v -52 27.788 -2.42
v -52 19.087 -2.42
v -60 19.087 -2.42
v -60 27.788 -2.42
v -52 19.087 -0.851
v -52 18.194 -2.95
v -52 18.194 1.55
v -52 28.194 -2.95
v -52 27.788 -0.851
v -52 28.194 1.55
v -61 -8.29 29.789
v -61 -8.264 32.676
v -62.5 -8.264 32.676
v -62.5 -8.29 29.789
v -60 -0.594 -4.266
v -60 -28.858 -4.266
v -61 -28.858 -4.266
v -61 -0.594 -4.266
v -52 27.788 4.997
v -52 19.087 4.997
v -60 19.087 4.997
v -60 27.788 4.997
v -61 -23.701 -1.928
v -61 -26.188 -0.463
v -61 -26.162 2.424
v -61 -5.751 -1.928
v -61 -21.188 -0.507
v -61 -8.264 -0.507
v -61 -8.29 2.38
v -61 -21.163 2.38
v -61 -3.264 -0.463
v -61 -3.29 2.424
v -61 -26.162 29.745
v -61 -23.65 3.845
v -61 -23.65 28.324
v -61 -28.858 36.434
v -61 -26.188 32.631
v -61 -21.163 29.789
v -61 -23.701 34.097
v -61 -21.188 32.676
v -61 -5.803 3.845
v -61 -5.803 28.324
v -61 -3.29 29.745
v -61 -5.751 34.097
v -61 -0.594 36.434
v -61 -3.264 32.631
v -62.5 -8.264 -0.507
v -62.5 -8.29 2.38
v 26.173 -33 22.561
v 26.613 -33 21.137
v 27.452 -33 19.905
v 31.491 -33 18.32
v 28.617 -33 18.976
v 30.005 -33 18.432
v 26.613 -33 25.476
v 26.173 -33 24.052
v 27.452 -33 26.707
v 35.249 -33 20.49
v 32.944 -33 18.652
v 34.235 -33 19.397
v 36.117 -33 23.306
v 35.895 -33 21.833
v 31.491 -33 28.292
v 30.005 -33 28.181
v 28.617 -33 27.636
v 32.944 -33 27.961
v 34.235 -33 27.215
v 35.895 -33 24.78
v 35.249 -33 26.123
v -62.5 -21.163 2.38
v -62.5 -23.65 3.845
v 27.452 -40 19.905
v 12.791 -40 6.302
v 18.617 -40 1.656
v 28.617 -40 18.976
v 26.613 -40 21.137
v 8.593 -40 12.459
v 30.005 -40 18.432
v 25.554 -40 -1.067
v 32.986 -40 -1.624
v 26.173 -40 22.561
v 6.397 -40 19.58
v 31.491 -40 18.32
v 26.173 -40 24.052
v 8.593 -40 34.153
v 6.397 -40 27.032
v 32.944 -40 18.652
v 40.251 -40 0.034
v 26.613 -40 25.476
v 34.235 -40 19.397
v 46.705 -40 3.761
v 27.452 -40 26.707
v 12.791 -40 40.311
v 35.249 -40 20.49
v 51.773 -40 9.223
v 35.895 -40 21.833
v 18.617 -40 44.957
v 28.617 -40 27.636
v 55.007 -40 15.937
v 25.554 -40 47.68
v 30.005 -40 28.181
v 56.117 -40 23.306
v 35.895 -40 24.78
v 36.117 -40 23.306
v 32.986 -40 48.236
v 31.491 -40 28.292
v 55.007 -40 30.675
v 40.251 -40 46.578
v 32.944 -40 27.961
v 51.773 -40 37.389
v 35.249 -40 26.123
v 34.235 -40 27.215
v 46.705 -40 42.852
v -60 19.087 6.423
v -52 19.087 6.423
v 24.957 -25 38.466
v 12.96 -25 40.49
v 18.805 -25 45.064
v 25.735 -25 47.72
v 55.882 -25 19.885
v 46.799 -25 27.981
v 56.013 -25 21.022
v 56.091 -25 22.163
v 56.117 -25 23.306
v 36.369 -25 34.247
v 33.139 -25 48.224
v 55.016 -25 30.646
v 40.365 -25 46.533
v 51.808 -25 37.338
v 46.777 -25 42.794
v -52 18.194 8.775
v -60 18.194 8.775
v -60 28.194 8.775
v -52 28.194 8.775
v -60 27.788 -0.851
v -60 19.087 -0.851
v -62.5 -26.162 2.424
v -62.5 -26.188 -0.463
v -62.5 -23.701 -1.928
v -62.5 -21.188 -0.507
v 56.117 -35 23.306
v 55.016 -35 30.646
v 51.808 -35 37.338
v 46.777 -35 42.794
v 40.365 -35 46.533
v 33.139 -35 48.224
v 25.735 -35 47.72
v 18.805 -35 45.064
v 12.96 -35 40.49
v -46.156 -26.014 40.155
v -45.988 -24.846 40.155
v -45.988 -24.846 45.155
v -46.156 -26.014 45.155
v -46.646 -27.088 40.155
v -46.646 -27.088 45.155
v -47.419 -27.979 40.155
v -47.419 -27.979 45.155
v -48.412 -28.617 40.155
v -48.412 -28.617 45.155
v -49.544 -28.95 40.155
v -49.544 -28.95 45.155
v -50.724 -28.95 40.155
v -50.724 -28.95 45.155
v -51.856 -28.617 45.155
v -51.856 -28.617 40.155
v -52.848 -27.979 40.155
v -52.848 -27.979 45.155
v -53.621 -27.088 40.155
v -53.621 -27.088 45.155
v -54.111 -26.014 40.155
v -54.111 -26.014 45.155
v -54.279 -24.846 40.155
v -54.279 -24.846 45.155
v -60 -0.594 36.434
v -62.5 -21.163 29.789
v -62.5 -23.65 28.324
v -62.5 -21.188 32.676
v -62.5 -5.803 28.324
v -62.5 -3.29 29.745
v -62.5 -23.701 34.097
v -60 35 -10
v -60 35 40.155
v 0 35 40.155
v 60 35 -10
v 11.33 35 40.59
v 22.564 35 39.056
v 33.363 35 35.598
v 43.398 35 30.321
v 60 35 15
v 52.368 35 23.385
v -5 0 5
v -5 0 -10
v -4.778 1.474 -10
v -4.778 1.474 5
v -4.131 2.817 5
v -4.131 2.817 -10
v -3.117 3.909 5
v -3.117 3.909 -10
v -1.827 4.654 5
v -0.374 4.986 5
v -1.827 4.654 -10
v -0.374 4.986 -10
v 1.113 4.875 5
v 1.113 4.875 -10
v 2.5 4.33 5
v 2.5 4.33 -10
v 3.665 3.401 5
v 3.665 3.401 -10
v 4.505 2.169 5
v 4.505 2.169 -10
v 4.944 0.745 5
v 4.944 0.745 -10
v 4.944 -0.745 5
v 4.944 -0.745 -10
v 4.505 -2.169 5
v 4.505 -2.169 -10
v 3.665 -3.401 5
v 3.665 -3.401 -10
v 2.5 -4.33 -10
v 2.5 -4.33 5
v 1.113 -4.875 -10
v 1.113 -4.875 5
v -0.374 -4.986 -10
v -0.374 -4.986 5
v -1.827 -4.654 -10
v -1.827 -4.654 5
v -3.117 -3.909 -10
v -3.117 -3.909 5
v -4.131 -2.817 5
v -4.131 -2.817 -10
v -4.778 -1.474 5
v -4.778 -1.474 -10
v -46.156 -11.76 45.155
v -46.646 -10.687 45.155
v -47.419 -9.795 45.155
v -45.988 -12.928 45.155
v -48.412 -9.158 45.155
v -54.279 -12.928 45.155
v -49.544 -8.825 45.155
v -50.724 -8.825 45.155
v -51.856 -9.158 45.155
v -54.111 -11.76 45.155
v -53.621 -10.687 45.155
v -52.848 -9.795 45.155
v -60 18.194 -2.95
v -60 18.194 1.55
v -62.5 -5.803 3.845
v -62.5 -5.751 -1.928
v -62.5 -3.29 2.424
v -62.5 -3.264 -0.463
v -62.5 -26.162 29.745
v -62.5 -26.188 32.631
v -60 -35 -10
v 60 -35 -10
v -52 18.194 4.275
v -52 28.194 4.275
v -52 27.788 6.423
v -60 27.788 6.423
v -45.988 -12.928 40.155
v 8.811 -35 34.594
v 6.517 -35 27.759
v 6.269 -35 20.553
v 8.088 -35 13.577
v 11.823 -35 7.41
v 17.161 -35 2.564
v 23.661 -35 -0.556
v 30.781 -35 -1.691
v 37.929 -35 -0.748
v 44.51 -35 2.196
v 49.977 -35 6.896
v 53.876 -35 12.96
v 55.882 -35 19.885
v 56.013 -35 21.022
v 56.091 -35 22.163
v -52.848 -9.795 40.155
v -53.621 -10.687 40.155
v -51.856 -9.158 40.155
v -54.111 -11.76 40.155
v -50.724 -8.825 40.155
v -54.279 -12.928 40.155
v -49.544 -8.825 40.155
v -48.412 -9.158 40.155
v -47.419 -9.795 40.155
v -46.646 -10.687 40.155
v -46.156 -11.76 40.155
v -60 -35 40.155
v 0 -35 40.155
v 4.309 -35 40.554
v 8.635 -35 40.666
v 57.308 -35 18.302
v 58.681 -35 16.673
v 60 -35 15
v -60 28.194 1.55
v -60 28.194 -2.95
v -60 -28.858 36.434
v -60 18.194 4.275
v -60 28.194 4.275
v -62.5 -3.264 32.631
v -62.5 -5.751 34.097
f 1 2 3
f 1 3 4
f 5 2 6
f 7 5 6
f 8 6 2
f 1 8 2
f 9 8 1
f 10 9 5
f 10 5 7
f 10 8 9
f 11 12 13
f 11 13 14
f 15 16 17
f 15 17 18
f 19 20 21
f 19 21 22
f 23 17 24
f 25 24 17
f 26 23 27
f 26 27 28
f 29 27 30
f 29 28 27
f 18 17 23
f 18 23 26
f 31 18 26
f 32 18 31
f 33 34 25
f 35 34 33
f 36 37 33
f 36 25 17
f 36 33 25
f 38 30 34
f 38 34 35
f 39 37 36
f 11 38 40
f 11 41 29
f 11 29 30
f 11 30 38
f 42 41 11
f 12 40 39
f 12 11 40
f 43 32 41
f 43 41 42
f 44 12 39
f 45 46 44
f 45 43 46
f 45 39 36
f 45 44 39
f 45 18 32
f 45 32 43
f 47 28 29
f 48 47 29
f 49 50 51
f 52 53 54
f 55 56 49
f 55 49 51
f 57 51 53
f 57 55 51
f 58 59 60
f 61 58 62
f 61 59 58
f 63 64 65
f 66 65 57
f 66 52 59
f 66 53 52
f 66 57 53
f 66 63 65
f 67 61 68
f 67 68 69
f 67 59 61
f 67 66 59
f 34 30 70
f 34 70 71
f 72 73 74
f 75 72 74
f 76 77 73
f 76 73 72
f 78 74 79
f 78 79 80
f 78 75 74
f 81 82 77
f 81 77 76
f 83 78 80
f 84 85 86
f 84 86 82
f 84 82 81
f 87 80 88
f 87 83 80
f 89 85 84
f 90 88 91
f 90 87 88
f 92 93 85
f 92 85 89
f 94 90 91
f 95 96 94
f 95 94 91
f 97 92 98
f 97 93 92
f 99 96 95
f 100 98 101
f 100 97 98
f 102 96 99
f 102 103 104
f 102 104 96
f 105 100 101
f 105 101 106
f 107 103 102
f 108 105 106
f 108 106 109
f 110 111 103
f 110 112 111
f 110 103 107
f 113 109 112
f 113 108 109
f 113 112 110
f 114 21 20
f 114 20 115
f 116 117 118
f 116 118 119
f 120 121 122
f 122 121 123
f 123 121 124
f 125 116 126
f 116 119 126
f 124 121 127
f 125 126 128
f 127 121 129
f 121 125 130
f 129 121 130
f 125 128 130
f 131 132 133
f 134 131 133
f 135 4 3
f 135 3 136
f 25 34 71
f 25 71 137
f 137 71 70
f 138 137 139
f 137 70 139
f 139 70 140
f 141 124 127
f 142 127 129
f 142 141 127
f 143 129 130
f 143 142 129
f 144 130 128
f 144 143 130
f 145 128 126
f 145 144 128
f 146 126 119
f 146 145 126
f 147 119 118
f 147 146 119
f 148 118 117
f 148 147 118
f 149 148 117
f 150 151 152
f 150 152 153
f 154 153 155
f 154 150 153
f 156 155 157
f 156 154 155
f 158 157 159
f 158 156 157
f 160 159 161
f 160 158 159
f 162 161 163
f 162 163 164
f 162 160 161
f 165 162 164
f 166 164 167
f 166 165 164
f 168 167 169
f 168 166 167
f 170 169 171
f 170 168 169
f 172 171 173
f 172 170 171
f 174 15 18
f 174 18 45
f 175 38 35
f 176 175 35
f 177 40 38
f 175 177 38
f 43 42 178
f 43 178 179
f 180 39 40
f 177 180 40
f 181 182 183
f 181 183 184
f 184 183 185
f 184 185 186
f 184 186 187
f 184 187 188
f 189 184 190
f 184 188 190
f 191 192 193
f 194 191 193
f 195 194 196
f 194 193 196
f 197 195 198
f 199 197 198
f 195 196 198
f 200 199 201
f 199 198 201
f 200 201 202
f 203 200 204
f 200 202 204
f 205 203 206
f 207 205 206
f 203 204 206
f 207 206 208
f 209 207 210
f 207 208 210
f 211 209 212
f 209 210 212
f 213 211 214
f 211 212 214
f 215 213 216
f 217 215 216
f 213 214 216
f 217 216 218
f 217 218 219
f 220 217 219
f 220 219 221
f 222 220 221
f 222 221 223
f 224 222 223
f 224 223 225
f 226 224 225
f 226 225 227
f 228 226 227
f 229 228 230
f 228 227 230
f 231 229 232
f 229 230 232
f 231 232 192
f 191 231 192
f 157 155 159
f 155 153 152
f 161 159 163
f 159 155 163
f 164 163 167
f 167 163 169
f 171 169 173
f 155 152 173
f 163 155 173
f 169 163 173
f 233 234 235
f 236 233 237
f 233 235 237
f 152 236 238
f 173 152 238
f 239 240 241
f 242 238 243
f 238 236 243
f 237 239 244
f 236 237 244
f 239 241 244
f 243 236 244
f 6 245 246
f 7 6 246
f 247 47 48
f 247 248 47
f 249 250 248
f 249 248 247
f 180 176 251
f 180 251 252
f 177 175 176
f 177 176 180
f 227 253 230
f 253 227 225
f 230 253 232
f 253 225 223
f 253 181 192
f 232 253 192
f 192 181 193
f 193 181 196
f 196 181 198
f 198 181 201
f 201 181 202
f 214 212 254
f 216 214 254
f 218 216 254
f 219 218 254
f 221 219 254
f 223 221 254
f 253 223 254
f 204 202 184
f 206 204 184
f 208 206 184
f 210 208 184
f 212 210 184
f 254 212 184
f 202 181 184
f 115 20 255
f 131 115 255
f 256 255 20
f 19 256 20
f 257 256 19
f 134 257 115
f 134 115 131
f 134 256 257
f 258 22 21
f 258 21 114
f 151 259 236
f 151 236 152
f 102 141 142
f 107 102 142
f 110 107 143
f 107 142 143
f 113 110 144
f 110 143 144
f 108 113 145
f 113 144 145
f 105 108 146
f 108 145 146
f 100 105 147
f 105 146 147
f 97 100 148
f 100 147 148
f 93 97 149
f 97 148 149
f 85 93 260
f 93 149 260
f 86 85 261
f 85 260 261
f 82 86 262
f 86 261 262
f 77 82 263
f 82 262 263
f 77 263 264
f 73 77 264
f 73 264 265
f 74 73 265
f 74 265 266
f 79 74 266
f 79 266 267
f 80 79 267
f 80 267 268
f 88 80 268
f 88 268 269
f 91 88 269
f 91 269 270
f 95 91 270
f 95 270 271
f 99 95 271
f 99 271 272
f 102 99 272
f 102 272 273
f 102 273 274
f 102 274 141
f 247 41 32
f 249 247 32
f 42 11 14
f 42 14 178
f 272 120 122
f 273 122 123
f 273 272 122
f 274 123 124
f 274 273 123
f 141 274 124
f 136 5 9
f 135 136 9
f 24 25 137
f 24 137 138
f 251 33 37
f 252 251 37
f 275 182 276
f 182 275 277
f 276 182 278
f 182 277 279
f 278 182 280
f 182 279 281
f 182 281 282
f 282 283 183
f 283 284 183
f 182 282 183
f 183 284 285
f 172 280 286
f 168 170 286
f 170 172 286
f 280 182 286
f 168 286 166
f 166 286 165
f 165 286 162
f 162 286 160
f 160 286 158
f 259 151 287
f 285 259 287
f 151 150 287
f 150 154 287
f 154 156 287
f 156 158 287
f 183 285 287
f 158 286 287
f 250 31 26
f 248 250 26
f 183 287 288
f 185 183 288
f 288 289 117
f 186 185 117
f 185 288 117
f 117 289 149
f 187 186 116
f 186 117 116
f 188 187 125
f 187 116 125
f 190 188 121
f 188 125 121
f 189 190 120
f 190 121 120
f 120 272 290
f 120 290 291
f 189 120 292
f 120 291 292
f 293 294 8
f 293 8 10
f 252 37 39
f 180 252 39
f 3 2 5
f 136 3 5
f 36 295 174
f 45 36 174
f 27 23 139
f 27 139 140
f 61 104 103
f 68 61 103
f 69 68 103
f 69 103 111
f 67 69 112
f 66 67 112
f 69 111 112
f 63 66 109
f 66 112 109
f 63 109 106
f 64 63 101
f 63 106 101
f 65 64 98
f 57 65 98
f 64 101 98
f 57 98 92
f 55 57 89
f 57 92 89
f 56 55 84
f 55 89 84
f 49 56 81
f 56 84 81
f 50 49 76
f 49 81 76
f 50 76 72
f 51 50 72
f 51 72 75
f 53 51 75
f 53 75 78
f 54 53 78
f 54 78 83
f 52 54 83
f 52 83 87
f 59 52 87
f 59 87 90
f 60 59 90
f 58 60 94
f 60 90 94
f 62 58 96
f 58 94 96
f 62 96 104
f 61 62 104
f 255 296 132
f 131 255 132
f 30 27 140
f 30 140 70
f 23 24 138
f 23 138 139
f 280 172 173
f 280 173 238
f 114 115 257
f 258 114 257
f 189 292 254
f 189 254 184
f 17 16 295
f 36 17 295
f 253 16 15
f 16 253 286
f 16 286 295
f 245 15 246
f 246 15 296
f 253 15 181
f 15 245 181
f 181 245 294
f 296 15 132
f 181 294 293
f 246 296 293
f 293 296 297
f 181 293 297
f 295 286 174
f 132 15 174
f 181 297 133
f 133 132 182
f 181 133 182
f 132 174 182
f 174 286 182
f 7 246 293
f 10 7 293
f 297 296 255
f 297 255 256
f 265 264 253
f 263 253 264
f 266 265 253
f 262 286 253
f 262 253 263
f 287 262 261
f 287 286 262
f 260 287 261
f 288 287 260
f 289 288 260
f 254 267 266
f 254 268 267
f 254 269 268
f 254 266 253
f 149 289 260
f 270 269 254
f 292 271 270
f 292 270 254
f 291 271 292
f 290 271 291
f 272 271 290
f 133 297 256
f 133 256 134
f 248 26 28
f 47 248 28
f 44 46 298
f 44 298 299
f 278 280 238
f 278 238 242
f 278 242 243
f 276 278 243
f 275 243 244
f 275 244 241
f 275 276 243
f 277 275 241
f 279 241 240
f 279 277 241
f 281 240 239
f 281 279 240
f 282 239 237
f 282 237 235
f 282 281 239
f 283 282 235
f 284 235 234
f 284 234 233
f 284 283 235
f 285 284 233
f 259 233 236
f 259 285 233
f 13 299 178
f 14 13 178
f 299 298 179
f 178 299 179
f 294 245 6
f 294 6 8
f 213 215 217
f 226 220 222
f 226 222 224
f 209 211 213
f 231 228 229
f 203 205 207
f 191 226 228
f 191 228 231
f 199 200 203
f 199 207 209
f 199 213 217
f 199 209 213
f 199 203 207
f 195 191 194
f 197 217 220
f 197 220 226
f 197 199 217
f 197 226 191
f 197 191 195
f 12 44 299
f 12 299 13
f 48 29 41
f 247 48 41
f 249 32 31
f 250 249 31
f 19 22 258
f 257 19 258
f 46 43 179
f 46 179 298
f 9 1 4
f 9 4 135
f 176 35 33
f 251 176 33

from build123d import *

# Parameters (mm, degrees)
SKETCH4_W                = 120
SKETCH4_H                = 70
BOSS_EXTRUDE1_DEPTH      = 10
SKETCH5_R                = 5
CUT_EXTRUDE1_DEPTH       = 40
BOSS_EXTRUDE2_DEPTH      = 70
SKETCH9_R                = 5
CUT_EXTRUDE2_DEPTH       = 15
SKETCH11_R               = 25
BOSS_EXTRUDE3_DEPTH      = 5
BOSS_EXTRUDE3_DEPTH_BACK = 10
SKETCH12_R               = 5
CUT_EXTRUDE3_DEPTH       = 7
BOSS_EXTRUDE5_DEPTH      = 5
SKETCH15_W               = 4.5
SKETCH15_H               = 10
CUT_EXTRUDE4_DEPTH       = 8
SKETCH16_W               = 1.569022944
SKETCH16_H               = 8.700945414
SKETCH16_W_2             = 1.426384494
BOSS_EXTRUDE6_DEPTH      = 8
SKETCH17_W               = 40.700182708
SKETCH17_H               = 28.264015769
BOSS_EXTRUDE7_DEPTH      = 1
BOSS_EXTRUDE8_DEPTH      = 1.5


with BuildPart() as part:
    # Sketch4 → Boss-Extrude1 (new body)
    with BuildSketch(Plane.XY):
        Rectangle(SKETCH4_W, SKETCH4_H)
    extrude(amount=-BOSS_EXTRUDE1_DEPTH)

    # Sketch5 → Cut-Extrude1 (cut)
    with BuildSketch(Plane.XY):
        Circle(SKETCH5_R)
    extrude(amount=-CUT_EXTRUDE1_DEPTH, mode=Mode.SUBTRACT)

    # Sketch8 → Boss-Extrude2 (add)
    with BuildSketch(Plane.XZ.offset(35)):
        with BuildLine():
            Line((-60, -10), (-60, 40.154750478))
            Line((-60, 40.154750478), (0, 40.154750478))
            ThreePointArc((0, 40.154750478), (33.3625471, 35.597841439), (60, 15))
            Line((60, 15), (60, -10))
            Line((60, -10), (-60, -10))
        make_face()
    extrude(amount=-BOSS_EXTRUDE2_DEPTH)

    # Sketch9 → Cut-Extrude2 (cut)
    with BuildSketch(Plane(origin=(0, 0, -10), x_dir=(-1, 0, 0), z_dir=(0, 0, -1))):
        Circle(SKETCH9_R)
    extrude(amount=-CUT_EXTRUDE2_DEPTH, mode=Mode.SUBTRACT)

    # Sketch11 → Boss-Extrude3 (add, two sides)
    with BuildSketch(Plane.XZ.offset(35)) as boss_extrude3_sk:
        with Locations((31.117439105, 23.306323577)):
            Circle(SKETCH11_R)
    extrude(amount=BOSS_EXTRUDE3_DEPTH)
    extrude(boss_extrude3_sk.sketch, amount=-BOSS_EXTRUDE3_DEPTH_BACK)

    # Sketch12 → Cut-Extrude3 (cut)
    with BuildSketch(Plane.XZ.offset(40)):
        with Locations((31.117439105, 23.306323577)):
            Circle(SKETCH12_R)
    extrude(amount=-CUT_EXTRUDE3_DEPTH, mode=Mode.SUBTRACT)

    # Sketch14 → Boss-Extrude5 (add)
    with BuildSketch(Plane.XY.offset(40.154750478)):
        with BuildLine():
            Line((-45.98826123, -12.928324025), (-45.98826123, -24.846408626))
            ThreePointArc((-45.98826123, -24.846408626), (-50.13368196, -28.991829356), (-54.279102691, -24.846408626))
            Line((-54.279102691, -24.846408626), (-54.279102691, -12.928324025))
            ThreePointArc((-54.279102691, -12.928324025), (-50.13368196, -8.782903295), (-45.98826123, -12.928324025))
        make_face()
    extrude(amount=BOSS_EXTRUDE5_DEPTH)

    # Sketch15 → Cut-Extrude4 (cut)
    with BuildSketch(Plane.ZY.offset(60)):
        with Locations((-0.699635799, 23.193765021)):
            Rectangle(SKETCH15_W, SKETCH15_H)
        with Locations((6.524606685, 23.193765021)):
            Rectangle(SKETCH15_W, SKETCH15_H)
    extrude(amount=-CUT_EXTRUDE4_DEPTH, mode=Mode.SUBTRACT)

    # Sketch16 → Boss-Extrude6 (add)
    with BuildSketch(Plane.ZY.offset(52)):
        with Locations((-1.63562366, 23.437743986)):
            Rectangle(SKETCH16_W, SKETCH16_H)
        with Locations((5.710256485, 23.437743986)):
            Rectangle(SKETCH16_W_2, SKETCH16_H)
    extrude(amount=BOSS_EXTRUDE6_DEPTH)

    # Sketch17 → Boss-Extrude7 (add)
    with BuildSketch(Plane.ZY.offset(60)):
        with Locations((16.084407409, -14.726216905)):
            Rectangle(SKETCH17_W, SKETCH17_H)
    extrude(amount=BOSS_EXTRUDE7_DEPTH)

    # Sketch18 → Boss-Extrude8 (add)
    with BuildSketch(Plane.ZY.offset(61)):
        Polygon((-0.506912877, -8.264193133), (2.379724675, -8.289824612), (3.845240963, -5.802738899), (2.424119698, -3.290021707), (-0.462517855, -3.264390229), (-1.928034142, -5.751475942), align=None)
        Polygon((34.09684896, -5.751475942), (32.675727695, -8.264193133), (29.789090142, -8.289824612), (28.323573855, -5.802738899), (29.74469512, -3.290021707), (32.631332673, -3.264390229), align=None)
        Polygon((-1.928034142, -23.700957867), (-0.506912877, -21.188240676), (2.379724675, -21.162609198), (3.845240963, -23.649694911), (2.424119698, -26.162412102), (-0.462517855, -26.18804358), align=None)
        Polygon((32.675727695, -21.188240676), (29.789090142, -21.162609198), (28.323573855, -23.649694911), (29.74469512, -26.162412102), (32.631332673, -26.18804358), (34.09684896, -23.700957867), align=None)
    extrude(amount=BOSS_EXTRUDE8_DEPTH)


solid = part.part
